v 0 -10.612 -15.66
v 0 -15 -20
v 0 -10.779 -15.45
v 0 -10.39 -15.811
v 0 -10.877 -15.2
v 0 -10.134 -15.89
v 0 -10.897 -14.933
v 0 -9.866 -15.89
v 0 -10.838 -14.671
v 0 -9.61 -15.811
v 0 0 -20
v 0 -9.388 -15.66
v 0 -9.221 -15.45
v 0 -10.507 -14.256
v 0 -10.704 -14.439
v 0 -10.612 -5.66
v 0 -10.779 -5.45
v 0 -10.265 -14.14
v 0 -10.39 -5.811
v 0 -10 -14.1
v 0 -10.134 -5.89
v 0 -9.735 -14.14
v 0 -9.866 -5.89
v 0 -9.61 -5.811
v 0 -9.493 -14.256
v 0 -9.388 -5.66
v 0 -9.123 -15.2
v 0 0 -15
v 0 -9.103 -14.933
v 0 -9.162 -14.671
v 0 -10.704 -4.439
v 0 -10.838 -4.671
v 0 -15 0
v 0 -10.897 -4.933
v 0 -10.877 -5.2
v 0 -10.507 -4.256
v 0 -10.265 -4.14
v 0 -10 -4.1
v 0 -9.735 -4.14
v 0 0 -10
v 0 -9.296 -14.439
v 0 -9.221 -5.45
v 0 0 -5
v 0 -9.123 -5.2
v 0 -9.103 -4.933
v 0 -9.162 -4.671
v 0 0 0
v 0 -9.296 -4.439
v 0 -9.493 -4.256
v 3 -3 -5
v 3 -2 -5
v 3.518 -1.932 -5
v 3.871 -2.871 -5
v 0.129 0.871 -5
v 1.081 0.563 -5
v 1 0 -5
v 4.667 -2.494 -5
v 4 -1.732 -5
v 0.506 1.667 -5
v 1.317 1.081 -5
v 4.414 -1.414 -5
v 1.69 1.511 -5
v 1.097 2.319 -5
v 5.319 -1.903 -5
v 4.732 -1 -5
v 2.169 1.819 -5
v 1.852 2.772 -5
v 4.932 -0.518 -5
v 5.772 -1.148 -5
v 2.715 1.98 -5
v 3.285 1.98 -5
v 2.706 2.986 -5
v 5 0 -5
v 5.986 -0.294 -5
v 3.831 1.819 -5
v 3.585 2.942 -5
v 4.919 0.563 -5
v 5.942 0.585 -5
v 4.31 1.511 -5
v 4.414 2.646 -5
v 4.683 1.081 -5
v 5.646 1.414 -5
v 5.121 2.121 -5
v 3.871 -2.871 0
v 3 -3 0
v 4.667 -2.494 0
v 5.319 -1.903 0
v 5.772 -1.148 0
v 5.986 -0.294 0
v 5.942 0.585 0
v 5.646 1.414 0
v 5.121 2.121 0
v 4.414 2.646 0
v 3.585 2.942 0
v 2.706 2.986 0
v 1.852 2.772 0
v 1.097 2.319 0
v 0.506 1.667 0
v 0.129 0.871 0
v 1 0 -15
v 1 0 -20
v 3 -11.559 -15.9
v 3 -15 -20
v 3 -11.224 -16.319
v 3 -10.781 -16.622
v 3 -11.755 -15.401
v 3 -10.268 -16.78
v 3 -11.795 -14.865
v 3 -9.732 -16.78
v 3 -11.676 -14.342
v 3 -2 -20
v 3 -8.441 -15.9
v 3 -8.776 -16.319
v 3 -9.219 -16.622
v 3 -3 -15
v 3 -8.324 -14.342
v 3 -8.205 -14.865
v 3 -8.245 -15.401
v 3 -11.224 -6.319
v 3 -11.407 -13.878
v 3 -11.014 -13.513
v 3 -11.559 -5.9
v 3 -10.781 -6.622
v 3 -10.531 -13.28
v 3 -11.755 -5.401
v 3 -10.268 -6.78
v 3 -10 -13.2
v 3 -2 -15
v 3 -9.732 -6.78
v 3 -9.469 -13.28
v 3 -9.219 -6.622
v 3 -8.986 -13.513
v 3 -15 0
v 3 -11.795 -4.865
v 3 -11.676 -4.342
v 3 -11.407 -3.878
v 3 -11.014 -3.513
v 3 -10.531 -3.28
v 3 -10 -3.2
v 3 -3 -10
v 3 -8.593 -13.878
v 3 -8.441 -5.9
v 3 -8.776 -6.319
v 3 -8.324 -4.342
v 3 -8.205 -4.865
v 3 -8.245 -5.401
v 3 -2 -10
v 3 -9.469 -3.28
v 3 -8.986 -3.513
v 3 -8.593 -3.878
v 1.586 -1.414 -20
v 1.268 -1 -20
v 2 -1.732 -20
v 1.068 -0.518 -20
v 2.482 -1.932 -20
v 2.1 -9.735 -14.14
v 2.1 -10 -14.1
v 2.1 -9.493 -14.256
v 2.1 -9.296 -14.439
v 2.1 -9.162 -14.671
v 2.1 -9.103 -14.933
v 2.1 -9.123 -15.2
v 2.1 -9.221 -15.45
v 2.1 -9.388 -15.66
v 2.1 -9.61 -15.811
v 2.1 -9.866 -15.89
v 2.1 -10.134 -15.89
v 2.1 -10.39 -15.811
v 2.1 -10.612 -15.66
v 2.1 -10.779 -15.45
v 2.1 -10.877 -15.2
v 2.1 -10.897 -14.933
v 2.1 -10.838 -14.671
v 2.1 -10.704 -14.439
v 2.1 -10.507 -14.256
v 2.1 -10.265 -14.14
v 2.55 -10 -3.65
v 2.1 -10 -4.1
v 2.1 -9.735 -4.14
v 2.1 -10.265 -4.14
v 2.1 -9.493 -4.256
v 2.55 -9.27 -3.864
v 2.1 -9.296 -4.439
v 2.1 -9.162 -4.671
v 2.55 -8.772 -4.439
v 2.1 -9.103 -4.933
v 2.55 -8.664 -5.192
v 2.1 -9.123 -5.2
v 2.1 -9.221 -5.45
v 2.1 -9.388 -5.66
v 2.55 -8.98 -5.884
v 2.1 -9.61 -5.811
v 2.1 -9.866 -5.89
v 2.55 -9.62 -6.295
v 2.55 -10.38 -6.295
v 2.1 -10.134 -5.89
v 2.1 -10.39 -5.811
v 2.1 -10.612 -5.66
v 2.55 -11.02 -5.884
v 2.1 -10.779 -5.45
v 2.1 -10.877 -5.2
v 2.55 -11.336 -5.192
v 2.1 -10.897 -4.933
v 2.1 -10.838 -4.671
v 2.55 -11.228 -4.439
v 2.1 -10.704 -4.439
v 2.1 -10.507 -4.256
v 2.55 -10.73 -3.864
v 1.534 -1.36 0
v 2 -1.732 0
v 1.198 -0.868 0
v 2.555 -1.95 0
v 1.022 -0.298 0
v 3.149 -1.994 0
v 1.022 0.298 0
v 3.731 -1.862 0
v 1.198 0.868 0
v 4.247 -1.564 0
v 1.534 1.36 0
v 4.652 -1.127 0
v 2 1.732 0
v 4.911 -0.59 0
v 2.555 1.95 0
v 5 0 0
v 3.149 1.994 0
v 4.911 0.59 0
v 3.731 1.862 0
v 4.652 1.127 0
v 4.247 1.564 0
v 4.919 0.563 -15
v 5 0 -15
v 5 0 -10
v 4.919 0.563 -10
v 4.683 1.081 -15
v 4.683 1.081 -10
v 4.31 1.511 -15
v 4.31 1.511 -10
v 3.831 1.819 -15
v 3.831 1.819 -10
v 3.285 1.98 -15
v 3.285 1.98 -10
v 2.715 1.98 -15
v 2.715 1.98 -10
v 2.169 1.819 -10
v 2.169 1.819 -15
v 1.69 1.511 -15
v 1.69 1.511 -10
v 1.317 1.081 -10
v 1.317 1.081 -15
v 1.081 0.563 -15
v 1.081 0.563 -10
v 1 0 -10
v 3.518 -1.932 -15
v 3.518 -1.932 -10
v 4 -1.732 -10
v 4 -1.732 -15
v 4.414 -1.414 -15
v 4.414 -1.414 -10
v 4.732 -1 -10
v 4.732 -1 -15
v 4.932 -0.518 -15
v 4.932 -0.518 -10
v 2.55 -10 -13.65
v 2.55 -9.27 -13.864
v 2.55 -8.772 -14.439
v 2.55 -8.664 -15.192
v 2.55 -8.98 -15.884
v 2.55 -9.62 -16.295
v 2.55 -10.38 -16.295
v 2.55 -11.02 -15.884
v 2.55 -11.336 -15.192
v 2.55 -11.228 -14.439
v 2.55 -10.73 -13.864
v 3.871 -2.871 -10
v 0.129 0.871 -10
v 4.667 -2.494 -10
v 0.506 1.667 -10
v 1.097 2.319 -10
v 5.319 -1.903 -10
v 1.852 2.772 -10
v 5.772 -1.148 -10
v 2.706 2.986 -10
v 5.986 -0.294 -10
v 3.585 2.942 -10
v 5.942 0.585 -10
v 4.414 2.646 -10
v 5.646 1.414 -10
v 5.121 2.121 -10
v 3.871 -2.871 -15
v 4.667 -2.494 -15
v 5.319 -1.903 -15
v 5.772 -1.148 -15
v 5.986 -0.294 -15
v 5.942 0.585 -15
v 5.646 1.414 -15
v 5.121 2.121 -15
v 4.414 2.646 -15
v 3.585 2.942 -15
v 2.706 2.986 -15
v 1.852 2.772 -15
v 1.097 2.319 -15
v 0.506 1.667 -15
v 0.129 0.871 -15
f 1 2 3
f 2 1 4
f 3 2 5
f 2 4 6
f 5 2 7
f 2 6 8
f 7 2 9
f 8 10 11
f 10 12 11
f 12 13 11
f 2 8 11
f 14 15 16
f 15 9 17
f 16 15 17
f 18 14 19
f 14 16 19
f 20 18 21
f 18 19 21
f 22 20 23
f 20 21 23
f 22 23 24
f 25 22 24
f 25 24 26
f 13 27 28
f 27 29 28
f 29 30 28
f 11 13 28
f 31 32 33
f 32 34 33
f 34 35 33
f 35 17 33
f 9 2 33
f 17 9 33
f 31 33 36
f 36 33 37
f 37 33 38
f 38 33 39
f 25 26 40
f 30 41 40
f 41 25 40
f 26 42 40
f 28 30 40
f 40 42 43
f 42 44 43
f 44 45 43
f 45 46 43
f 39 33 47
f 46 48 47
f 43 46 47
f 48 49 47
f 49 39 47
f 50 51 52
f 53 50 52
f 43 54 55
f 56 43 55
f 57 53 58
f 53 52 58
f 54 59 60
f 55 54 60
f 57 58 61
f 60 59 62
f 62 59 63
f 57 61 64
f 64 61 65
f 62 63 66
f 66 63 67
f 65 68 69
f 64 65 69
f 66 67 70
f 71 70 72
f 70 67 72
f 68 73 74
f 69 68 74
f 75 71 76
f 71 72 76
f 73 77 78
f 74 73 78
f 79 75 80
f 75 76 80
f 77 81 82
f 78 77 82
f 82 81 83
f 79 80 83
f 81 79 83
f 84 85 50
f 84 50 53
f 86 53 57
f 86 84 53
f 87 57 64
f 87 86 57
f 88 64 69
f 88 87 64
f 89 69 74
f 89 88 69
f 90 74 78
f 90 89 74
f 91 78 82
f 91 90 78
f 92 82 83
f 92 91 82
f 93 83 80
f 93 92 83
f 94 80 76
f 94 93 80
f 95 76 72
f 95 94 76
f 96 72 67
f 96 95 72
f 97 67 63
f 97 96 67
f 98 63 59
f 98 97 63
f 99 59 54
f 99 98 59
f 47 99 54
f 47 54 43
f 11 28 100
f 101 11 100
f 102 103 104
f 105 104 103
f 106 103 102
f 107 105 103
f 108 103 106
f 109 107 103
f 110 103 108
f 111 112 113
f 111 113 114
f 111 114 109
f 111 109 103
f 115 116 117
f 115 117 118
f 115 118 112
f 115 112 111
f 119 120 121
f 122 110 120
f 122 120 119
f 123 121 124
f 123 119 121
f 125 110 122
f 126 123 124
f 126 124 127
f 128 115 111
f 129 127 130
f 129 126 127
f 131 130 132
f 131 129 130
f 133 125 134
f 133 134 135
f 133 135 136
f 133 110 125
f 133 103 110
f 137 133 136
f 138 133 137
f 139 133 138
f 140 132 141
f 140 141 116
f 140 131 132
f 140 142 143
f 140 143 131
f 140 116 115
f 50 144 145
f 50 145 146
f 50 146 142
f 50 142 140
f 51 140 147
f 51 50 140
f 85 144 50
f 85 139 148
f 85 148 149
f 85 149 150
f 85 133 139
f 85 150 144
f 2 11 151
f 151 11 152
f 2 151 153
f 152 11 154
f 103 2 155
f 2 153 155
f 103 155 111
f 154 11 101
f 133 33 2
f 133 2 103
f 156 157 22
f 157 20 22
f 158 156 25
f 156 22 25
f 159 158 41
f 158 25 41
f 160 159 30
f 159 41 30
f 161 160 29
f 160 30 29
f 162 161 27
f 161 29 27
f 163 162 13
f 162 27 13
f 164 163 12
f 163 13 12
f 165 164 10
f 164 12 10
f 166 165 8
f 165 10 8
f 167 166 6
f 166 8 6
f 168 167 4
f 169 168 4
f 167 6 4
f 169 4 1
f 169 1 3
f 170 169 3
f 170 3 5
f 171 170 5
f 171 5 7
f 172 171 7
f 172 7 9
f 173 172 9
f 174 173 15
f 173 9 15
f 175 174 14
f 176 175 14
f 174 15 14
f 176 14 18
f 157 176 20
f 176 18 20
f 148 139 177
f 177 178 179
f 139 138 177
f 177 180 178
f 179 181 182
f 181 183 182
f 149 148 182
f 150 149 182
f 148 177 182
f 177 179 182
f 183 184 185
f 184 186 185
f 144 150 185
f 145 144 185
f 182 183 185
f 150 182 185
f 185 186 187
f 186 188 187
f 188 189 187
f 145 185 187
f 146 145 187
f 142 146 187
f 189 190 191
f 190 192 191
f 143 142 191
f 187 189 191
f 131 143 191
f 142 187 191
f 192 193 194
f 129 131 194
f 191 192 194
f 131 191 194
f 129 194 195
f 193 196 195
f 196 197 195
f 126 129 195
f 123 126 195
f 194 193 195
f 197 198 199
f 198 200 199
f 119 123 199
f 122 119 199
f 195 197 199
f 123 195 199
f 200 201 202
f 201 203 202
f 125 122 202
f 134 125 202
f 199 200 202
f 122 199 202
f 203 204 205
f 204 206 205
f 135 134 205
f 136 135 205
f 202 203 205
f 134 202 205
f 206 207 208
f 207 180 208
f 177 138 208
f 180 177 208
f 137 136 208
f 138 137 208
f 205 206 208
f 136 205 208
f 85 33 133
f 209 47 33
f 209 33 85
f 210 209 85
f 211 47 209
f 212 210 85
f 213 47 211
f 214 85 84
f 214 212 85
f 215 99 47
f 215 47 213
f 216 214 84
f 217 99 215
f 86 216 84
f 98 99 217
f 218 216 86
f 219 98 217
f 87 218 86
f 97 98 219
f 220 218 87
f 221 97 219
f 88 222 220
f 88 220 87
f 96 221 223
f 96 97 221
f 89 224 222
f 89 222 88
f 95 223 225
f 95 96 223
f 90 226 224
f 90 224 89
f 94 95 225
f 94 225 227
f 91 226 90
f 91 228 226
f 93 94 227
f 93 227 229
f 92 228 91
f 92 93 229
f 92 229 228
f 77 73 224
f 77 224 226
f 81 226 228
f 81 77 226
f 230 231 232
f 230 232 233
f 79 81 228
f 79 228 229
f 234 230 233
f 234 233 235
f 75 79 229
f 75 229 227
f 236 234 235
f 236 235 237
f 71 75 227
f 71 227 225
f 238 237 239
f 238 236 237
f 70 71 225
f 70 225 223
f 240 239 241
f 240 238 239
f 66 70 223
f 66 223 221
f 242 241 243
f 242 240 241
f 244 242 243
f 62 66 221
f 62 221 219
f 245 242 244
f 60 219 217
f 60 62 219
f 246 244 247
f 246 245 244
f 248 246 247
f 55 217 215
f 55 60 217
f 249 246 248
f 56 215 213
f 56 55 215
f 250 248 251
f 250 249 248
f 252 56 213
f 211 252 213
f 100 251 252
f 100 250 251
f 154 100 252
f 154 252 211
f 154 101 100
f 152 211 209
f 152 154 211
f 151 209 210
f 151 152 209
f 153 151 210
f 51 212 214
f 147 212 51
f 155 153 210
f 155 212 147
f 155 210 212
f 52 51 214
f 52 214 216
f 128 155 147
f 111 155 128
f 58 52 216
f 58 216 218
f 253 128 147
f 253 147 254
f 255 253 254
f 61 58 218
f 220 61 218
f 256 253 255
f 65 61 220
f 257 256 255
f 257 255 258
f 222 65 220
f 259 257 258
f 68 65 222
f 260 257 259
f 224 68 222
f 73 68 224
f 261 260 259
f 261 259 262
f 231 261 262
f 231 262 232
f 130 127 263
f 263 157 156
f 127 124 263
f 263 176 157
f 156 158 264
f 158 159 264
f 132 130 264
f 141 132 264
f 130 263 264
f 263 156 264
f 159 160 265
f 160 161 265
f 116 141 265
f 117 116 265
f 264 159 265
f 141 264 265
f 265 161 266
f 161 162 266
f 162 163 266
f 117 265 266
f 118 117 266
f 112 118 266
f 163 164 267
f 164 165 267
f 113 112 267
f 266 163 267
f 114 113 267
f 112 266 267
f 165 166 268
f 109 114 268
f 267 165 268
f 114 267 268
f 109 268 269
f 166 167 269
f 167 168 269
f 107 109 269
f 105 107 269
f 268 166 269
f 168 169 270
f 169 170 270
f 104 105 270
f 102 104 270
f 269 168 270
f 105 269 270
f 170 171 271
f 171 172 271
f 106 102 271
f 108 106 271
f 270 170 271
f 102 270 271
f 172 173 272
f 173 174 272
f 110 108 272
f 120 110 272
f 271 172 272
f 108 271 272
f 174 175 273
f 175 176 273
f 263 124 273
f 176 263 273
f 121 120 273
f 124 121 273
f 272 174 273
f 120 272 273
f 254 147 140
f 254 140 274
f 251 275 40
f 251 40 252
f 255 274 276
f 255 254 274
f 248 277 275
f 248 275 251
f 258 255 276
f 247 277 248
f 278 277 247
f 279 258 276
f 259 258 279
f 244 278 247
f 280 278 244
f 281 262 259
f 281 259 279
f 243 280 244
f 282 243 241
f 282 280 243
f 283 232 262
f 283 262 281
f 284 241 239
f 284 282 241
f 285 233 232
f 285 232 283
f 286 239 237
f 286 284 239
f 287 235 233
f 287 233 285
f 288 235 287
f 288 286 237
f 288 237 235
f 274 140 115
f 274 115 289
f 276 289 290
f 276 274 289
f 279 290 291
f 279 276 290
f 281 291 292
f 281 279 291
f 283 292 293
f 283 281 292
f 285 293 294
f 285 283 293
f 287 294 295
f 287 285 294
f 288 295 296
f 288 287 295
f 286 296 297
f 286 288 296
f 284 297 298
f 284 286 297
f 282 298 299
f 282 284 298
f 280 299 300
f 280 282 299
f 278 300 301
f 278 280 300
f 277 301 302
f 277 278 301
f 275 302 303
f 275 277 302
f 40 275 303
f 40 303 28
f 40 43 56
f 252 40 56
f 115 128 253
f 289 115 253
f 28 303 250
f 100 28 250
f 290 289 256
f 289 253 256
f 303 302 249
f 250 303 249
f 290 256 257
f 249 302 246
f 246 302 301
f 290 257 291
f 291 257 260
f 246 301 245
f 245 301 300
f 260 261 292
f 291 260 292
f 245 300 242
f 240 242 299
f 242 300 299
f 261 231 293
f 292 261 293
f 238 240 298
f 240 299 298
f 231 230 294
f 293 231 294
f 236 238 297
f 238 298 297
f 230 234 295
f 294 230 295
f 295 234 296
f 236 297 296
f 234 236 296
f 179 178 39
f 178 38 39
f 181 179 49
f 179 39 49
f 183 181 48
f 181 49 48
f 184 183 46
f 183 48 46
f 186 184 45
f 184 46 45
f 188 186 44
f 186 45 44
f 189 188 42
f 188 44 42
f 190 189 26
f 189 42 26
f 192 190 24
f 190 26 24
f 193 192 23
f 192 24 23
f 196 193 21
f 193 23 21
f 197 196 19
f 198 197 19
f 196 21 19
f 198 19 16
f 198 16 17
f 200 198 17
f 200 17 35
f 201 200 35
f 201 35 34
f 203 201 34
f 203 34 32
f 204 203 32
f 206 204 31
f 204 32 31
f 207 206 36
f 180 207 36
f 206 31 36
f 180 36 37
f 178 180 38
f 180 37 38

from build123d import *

# Parameters (mm, degrees)
SKETCH1_W                                            = 3
SKETCH1_H                                            = 15
BOSS_EXTRUDE1_DEPTH                                  = 20
SKETCH2_R                                            = 3
BOSS_EXTRUDE2_DEPTH                                  = 5
LPATTERN2_COUNT                                      = 2
LPATTERN2_PITCH                                      = 10
CUT_EXTRUDE1_DEPTH                                   = 26.709920264
CUT_EXTRUDE1_DEPTH_BACK                              = 26.709920264
SKETCH3_R                                            = 2
CSK_FOR_M1_6_COUNTERSUNK_FLAT_HEAD_SCREW_D           = 1.8
CSK_FOR_M1_6_COUNTERSUNK_FLAT_HEAD_SCREW_DEPTH       = 3
CSK_FOR_M1_6_COUNTERSUNK_FLAT_HEAD_SCREW_CSINK_D     = 3.6
CSK_FOR_M1_6_COUNTERSUNK_FLAT_HEAD_SCREW_CSINK_ANGLE = 90
CSK_FOR_M1_6_COUNTERSUNK_FLAT_HEAD_SCREW_TIP         = 0.540774557


with BuildPart() as part:
    # Sketch1 → Boss-Extrude1 (new body)
    with BuildSketch(Plane.XY):
        with Locations((1.5, -7.5)):
            Rectangle(SKETCH1_W, SKETCH1_H)
    extrude(amount=-BOSS_EXTRUDE1_DEPTH)

    # Sketch2 → Boss-Extrude2 (add)
    with BuildSketch(Plane.XY):
        with Locations((3, 0)):
            Circle(SKETCH2_R)
    boss_extrude2 = extrude(amount=-BOSS_EXTRUDE2_DEPTH)

    # LPattern2: Boss-Extrude2 ×2
    with Locations(*[(0, 0, -i * LPATTERN2_PITCH) for i in range(1, LPATTERN2_COUNT)]):
        add(boss_extrude2)

    # Sketch3 → Cut-Extrude1 (cut, two sides: drawn at the far end of the back side and taken through both)
    with BuildSketch(Plane.XY.offset(-CUT_EXTRUDE1_DEPTH_BACK)):
        with Locations((3, 0)):
            Circle(SKETCH3_R)
    extrude(amount=CUT_EXTRUDE1_DEPTH + CUT_EXTRUDE1_DEPTH_BACK, mode=Mode.SUBTRACT)

    # CSK for M1.6 Countersunk Flat Head Screw1
    with Locations(Plane(origin=(3, 0, 0), x_dir=(0, 0, -1), z_dir=(1, 0, 0))):
        with Locations((5, -10), (15, -10)):
            CounterSinkHole(CSK_FOR_M1_6_COUNTERSUNK_FLAT_HEAD_SCREW_D / 2, CSK_FOR_M1_6_COUNTERSUNK_FLAT_HEAD_SCREW_CSINK_D / 2, depth=CSK_FOR_M1_6_COUNTERSUNK_FLAT_HEAD_SCREW_DEPTH, counter_sink_angle=CSK_FOR_M1_6_COUNTERSUNK_FLAT_HEAD_SCREW_CSINK_ANGLE)
            with Locations((0, 0, -(CSK_FOR_M1_6_COUNTERSUNK_FLAT_HEAD_SCREW_DEPTH + CSK_FOR_M1_6_COUNTERSUNK_FLAT_HEAD_SCREW_TIP / 2))):  # 118° drill point
                Cone(0, CSK_FOR_M1_6_COUNTERSUNK_FLAT_HEAD_SCREW_D / 2, CSK_FOR_M1_6_COUNTERSUNK_FLAT_HEAD_SCREW_TIP, mode=Mode.SUBTRACT)


solid = part.part
